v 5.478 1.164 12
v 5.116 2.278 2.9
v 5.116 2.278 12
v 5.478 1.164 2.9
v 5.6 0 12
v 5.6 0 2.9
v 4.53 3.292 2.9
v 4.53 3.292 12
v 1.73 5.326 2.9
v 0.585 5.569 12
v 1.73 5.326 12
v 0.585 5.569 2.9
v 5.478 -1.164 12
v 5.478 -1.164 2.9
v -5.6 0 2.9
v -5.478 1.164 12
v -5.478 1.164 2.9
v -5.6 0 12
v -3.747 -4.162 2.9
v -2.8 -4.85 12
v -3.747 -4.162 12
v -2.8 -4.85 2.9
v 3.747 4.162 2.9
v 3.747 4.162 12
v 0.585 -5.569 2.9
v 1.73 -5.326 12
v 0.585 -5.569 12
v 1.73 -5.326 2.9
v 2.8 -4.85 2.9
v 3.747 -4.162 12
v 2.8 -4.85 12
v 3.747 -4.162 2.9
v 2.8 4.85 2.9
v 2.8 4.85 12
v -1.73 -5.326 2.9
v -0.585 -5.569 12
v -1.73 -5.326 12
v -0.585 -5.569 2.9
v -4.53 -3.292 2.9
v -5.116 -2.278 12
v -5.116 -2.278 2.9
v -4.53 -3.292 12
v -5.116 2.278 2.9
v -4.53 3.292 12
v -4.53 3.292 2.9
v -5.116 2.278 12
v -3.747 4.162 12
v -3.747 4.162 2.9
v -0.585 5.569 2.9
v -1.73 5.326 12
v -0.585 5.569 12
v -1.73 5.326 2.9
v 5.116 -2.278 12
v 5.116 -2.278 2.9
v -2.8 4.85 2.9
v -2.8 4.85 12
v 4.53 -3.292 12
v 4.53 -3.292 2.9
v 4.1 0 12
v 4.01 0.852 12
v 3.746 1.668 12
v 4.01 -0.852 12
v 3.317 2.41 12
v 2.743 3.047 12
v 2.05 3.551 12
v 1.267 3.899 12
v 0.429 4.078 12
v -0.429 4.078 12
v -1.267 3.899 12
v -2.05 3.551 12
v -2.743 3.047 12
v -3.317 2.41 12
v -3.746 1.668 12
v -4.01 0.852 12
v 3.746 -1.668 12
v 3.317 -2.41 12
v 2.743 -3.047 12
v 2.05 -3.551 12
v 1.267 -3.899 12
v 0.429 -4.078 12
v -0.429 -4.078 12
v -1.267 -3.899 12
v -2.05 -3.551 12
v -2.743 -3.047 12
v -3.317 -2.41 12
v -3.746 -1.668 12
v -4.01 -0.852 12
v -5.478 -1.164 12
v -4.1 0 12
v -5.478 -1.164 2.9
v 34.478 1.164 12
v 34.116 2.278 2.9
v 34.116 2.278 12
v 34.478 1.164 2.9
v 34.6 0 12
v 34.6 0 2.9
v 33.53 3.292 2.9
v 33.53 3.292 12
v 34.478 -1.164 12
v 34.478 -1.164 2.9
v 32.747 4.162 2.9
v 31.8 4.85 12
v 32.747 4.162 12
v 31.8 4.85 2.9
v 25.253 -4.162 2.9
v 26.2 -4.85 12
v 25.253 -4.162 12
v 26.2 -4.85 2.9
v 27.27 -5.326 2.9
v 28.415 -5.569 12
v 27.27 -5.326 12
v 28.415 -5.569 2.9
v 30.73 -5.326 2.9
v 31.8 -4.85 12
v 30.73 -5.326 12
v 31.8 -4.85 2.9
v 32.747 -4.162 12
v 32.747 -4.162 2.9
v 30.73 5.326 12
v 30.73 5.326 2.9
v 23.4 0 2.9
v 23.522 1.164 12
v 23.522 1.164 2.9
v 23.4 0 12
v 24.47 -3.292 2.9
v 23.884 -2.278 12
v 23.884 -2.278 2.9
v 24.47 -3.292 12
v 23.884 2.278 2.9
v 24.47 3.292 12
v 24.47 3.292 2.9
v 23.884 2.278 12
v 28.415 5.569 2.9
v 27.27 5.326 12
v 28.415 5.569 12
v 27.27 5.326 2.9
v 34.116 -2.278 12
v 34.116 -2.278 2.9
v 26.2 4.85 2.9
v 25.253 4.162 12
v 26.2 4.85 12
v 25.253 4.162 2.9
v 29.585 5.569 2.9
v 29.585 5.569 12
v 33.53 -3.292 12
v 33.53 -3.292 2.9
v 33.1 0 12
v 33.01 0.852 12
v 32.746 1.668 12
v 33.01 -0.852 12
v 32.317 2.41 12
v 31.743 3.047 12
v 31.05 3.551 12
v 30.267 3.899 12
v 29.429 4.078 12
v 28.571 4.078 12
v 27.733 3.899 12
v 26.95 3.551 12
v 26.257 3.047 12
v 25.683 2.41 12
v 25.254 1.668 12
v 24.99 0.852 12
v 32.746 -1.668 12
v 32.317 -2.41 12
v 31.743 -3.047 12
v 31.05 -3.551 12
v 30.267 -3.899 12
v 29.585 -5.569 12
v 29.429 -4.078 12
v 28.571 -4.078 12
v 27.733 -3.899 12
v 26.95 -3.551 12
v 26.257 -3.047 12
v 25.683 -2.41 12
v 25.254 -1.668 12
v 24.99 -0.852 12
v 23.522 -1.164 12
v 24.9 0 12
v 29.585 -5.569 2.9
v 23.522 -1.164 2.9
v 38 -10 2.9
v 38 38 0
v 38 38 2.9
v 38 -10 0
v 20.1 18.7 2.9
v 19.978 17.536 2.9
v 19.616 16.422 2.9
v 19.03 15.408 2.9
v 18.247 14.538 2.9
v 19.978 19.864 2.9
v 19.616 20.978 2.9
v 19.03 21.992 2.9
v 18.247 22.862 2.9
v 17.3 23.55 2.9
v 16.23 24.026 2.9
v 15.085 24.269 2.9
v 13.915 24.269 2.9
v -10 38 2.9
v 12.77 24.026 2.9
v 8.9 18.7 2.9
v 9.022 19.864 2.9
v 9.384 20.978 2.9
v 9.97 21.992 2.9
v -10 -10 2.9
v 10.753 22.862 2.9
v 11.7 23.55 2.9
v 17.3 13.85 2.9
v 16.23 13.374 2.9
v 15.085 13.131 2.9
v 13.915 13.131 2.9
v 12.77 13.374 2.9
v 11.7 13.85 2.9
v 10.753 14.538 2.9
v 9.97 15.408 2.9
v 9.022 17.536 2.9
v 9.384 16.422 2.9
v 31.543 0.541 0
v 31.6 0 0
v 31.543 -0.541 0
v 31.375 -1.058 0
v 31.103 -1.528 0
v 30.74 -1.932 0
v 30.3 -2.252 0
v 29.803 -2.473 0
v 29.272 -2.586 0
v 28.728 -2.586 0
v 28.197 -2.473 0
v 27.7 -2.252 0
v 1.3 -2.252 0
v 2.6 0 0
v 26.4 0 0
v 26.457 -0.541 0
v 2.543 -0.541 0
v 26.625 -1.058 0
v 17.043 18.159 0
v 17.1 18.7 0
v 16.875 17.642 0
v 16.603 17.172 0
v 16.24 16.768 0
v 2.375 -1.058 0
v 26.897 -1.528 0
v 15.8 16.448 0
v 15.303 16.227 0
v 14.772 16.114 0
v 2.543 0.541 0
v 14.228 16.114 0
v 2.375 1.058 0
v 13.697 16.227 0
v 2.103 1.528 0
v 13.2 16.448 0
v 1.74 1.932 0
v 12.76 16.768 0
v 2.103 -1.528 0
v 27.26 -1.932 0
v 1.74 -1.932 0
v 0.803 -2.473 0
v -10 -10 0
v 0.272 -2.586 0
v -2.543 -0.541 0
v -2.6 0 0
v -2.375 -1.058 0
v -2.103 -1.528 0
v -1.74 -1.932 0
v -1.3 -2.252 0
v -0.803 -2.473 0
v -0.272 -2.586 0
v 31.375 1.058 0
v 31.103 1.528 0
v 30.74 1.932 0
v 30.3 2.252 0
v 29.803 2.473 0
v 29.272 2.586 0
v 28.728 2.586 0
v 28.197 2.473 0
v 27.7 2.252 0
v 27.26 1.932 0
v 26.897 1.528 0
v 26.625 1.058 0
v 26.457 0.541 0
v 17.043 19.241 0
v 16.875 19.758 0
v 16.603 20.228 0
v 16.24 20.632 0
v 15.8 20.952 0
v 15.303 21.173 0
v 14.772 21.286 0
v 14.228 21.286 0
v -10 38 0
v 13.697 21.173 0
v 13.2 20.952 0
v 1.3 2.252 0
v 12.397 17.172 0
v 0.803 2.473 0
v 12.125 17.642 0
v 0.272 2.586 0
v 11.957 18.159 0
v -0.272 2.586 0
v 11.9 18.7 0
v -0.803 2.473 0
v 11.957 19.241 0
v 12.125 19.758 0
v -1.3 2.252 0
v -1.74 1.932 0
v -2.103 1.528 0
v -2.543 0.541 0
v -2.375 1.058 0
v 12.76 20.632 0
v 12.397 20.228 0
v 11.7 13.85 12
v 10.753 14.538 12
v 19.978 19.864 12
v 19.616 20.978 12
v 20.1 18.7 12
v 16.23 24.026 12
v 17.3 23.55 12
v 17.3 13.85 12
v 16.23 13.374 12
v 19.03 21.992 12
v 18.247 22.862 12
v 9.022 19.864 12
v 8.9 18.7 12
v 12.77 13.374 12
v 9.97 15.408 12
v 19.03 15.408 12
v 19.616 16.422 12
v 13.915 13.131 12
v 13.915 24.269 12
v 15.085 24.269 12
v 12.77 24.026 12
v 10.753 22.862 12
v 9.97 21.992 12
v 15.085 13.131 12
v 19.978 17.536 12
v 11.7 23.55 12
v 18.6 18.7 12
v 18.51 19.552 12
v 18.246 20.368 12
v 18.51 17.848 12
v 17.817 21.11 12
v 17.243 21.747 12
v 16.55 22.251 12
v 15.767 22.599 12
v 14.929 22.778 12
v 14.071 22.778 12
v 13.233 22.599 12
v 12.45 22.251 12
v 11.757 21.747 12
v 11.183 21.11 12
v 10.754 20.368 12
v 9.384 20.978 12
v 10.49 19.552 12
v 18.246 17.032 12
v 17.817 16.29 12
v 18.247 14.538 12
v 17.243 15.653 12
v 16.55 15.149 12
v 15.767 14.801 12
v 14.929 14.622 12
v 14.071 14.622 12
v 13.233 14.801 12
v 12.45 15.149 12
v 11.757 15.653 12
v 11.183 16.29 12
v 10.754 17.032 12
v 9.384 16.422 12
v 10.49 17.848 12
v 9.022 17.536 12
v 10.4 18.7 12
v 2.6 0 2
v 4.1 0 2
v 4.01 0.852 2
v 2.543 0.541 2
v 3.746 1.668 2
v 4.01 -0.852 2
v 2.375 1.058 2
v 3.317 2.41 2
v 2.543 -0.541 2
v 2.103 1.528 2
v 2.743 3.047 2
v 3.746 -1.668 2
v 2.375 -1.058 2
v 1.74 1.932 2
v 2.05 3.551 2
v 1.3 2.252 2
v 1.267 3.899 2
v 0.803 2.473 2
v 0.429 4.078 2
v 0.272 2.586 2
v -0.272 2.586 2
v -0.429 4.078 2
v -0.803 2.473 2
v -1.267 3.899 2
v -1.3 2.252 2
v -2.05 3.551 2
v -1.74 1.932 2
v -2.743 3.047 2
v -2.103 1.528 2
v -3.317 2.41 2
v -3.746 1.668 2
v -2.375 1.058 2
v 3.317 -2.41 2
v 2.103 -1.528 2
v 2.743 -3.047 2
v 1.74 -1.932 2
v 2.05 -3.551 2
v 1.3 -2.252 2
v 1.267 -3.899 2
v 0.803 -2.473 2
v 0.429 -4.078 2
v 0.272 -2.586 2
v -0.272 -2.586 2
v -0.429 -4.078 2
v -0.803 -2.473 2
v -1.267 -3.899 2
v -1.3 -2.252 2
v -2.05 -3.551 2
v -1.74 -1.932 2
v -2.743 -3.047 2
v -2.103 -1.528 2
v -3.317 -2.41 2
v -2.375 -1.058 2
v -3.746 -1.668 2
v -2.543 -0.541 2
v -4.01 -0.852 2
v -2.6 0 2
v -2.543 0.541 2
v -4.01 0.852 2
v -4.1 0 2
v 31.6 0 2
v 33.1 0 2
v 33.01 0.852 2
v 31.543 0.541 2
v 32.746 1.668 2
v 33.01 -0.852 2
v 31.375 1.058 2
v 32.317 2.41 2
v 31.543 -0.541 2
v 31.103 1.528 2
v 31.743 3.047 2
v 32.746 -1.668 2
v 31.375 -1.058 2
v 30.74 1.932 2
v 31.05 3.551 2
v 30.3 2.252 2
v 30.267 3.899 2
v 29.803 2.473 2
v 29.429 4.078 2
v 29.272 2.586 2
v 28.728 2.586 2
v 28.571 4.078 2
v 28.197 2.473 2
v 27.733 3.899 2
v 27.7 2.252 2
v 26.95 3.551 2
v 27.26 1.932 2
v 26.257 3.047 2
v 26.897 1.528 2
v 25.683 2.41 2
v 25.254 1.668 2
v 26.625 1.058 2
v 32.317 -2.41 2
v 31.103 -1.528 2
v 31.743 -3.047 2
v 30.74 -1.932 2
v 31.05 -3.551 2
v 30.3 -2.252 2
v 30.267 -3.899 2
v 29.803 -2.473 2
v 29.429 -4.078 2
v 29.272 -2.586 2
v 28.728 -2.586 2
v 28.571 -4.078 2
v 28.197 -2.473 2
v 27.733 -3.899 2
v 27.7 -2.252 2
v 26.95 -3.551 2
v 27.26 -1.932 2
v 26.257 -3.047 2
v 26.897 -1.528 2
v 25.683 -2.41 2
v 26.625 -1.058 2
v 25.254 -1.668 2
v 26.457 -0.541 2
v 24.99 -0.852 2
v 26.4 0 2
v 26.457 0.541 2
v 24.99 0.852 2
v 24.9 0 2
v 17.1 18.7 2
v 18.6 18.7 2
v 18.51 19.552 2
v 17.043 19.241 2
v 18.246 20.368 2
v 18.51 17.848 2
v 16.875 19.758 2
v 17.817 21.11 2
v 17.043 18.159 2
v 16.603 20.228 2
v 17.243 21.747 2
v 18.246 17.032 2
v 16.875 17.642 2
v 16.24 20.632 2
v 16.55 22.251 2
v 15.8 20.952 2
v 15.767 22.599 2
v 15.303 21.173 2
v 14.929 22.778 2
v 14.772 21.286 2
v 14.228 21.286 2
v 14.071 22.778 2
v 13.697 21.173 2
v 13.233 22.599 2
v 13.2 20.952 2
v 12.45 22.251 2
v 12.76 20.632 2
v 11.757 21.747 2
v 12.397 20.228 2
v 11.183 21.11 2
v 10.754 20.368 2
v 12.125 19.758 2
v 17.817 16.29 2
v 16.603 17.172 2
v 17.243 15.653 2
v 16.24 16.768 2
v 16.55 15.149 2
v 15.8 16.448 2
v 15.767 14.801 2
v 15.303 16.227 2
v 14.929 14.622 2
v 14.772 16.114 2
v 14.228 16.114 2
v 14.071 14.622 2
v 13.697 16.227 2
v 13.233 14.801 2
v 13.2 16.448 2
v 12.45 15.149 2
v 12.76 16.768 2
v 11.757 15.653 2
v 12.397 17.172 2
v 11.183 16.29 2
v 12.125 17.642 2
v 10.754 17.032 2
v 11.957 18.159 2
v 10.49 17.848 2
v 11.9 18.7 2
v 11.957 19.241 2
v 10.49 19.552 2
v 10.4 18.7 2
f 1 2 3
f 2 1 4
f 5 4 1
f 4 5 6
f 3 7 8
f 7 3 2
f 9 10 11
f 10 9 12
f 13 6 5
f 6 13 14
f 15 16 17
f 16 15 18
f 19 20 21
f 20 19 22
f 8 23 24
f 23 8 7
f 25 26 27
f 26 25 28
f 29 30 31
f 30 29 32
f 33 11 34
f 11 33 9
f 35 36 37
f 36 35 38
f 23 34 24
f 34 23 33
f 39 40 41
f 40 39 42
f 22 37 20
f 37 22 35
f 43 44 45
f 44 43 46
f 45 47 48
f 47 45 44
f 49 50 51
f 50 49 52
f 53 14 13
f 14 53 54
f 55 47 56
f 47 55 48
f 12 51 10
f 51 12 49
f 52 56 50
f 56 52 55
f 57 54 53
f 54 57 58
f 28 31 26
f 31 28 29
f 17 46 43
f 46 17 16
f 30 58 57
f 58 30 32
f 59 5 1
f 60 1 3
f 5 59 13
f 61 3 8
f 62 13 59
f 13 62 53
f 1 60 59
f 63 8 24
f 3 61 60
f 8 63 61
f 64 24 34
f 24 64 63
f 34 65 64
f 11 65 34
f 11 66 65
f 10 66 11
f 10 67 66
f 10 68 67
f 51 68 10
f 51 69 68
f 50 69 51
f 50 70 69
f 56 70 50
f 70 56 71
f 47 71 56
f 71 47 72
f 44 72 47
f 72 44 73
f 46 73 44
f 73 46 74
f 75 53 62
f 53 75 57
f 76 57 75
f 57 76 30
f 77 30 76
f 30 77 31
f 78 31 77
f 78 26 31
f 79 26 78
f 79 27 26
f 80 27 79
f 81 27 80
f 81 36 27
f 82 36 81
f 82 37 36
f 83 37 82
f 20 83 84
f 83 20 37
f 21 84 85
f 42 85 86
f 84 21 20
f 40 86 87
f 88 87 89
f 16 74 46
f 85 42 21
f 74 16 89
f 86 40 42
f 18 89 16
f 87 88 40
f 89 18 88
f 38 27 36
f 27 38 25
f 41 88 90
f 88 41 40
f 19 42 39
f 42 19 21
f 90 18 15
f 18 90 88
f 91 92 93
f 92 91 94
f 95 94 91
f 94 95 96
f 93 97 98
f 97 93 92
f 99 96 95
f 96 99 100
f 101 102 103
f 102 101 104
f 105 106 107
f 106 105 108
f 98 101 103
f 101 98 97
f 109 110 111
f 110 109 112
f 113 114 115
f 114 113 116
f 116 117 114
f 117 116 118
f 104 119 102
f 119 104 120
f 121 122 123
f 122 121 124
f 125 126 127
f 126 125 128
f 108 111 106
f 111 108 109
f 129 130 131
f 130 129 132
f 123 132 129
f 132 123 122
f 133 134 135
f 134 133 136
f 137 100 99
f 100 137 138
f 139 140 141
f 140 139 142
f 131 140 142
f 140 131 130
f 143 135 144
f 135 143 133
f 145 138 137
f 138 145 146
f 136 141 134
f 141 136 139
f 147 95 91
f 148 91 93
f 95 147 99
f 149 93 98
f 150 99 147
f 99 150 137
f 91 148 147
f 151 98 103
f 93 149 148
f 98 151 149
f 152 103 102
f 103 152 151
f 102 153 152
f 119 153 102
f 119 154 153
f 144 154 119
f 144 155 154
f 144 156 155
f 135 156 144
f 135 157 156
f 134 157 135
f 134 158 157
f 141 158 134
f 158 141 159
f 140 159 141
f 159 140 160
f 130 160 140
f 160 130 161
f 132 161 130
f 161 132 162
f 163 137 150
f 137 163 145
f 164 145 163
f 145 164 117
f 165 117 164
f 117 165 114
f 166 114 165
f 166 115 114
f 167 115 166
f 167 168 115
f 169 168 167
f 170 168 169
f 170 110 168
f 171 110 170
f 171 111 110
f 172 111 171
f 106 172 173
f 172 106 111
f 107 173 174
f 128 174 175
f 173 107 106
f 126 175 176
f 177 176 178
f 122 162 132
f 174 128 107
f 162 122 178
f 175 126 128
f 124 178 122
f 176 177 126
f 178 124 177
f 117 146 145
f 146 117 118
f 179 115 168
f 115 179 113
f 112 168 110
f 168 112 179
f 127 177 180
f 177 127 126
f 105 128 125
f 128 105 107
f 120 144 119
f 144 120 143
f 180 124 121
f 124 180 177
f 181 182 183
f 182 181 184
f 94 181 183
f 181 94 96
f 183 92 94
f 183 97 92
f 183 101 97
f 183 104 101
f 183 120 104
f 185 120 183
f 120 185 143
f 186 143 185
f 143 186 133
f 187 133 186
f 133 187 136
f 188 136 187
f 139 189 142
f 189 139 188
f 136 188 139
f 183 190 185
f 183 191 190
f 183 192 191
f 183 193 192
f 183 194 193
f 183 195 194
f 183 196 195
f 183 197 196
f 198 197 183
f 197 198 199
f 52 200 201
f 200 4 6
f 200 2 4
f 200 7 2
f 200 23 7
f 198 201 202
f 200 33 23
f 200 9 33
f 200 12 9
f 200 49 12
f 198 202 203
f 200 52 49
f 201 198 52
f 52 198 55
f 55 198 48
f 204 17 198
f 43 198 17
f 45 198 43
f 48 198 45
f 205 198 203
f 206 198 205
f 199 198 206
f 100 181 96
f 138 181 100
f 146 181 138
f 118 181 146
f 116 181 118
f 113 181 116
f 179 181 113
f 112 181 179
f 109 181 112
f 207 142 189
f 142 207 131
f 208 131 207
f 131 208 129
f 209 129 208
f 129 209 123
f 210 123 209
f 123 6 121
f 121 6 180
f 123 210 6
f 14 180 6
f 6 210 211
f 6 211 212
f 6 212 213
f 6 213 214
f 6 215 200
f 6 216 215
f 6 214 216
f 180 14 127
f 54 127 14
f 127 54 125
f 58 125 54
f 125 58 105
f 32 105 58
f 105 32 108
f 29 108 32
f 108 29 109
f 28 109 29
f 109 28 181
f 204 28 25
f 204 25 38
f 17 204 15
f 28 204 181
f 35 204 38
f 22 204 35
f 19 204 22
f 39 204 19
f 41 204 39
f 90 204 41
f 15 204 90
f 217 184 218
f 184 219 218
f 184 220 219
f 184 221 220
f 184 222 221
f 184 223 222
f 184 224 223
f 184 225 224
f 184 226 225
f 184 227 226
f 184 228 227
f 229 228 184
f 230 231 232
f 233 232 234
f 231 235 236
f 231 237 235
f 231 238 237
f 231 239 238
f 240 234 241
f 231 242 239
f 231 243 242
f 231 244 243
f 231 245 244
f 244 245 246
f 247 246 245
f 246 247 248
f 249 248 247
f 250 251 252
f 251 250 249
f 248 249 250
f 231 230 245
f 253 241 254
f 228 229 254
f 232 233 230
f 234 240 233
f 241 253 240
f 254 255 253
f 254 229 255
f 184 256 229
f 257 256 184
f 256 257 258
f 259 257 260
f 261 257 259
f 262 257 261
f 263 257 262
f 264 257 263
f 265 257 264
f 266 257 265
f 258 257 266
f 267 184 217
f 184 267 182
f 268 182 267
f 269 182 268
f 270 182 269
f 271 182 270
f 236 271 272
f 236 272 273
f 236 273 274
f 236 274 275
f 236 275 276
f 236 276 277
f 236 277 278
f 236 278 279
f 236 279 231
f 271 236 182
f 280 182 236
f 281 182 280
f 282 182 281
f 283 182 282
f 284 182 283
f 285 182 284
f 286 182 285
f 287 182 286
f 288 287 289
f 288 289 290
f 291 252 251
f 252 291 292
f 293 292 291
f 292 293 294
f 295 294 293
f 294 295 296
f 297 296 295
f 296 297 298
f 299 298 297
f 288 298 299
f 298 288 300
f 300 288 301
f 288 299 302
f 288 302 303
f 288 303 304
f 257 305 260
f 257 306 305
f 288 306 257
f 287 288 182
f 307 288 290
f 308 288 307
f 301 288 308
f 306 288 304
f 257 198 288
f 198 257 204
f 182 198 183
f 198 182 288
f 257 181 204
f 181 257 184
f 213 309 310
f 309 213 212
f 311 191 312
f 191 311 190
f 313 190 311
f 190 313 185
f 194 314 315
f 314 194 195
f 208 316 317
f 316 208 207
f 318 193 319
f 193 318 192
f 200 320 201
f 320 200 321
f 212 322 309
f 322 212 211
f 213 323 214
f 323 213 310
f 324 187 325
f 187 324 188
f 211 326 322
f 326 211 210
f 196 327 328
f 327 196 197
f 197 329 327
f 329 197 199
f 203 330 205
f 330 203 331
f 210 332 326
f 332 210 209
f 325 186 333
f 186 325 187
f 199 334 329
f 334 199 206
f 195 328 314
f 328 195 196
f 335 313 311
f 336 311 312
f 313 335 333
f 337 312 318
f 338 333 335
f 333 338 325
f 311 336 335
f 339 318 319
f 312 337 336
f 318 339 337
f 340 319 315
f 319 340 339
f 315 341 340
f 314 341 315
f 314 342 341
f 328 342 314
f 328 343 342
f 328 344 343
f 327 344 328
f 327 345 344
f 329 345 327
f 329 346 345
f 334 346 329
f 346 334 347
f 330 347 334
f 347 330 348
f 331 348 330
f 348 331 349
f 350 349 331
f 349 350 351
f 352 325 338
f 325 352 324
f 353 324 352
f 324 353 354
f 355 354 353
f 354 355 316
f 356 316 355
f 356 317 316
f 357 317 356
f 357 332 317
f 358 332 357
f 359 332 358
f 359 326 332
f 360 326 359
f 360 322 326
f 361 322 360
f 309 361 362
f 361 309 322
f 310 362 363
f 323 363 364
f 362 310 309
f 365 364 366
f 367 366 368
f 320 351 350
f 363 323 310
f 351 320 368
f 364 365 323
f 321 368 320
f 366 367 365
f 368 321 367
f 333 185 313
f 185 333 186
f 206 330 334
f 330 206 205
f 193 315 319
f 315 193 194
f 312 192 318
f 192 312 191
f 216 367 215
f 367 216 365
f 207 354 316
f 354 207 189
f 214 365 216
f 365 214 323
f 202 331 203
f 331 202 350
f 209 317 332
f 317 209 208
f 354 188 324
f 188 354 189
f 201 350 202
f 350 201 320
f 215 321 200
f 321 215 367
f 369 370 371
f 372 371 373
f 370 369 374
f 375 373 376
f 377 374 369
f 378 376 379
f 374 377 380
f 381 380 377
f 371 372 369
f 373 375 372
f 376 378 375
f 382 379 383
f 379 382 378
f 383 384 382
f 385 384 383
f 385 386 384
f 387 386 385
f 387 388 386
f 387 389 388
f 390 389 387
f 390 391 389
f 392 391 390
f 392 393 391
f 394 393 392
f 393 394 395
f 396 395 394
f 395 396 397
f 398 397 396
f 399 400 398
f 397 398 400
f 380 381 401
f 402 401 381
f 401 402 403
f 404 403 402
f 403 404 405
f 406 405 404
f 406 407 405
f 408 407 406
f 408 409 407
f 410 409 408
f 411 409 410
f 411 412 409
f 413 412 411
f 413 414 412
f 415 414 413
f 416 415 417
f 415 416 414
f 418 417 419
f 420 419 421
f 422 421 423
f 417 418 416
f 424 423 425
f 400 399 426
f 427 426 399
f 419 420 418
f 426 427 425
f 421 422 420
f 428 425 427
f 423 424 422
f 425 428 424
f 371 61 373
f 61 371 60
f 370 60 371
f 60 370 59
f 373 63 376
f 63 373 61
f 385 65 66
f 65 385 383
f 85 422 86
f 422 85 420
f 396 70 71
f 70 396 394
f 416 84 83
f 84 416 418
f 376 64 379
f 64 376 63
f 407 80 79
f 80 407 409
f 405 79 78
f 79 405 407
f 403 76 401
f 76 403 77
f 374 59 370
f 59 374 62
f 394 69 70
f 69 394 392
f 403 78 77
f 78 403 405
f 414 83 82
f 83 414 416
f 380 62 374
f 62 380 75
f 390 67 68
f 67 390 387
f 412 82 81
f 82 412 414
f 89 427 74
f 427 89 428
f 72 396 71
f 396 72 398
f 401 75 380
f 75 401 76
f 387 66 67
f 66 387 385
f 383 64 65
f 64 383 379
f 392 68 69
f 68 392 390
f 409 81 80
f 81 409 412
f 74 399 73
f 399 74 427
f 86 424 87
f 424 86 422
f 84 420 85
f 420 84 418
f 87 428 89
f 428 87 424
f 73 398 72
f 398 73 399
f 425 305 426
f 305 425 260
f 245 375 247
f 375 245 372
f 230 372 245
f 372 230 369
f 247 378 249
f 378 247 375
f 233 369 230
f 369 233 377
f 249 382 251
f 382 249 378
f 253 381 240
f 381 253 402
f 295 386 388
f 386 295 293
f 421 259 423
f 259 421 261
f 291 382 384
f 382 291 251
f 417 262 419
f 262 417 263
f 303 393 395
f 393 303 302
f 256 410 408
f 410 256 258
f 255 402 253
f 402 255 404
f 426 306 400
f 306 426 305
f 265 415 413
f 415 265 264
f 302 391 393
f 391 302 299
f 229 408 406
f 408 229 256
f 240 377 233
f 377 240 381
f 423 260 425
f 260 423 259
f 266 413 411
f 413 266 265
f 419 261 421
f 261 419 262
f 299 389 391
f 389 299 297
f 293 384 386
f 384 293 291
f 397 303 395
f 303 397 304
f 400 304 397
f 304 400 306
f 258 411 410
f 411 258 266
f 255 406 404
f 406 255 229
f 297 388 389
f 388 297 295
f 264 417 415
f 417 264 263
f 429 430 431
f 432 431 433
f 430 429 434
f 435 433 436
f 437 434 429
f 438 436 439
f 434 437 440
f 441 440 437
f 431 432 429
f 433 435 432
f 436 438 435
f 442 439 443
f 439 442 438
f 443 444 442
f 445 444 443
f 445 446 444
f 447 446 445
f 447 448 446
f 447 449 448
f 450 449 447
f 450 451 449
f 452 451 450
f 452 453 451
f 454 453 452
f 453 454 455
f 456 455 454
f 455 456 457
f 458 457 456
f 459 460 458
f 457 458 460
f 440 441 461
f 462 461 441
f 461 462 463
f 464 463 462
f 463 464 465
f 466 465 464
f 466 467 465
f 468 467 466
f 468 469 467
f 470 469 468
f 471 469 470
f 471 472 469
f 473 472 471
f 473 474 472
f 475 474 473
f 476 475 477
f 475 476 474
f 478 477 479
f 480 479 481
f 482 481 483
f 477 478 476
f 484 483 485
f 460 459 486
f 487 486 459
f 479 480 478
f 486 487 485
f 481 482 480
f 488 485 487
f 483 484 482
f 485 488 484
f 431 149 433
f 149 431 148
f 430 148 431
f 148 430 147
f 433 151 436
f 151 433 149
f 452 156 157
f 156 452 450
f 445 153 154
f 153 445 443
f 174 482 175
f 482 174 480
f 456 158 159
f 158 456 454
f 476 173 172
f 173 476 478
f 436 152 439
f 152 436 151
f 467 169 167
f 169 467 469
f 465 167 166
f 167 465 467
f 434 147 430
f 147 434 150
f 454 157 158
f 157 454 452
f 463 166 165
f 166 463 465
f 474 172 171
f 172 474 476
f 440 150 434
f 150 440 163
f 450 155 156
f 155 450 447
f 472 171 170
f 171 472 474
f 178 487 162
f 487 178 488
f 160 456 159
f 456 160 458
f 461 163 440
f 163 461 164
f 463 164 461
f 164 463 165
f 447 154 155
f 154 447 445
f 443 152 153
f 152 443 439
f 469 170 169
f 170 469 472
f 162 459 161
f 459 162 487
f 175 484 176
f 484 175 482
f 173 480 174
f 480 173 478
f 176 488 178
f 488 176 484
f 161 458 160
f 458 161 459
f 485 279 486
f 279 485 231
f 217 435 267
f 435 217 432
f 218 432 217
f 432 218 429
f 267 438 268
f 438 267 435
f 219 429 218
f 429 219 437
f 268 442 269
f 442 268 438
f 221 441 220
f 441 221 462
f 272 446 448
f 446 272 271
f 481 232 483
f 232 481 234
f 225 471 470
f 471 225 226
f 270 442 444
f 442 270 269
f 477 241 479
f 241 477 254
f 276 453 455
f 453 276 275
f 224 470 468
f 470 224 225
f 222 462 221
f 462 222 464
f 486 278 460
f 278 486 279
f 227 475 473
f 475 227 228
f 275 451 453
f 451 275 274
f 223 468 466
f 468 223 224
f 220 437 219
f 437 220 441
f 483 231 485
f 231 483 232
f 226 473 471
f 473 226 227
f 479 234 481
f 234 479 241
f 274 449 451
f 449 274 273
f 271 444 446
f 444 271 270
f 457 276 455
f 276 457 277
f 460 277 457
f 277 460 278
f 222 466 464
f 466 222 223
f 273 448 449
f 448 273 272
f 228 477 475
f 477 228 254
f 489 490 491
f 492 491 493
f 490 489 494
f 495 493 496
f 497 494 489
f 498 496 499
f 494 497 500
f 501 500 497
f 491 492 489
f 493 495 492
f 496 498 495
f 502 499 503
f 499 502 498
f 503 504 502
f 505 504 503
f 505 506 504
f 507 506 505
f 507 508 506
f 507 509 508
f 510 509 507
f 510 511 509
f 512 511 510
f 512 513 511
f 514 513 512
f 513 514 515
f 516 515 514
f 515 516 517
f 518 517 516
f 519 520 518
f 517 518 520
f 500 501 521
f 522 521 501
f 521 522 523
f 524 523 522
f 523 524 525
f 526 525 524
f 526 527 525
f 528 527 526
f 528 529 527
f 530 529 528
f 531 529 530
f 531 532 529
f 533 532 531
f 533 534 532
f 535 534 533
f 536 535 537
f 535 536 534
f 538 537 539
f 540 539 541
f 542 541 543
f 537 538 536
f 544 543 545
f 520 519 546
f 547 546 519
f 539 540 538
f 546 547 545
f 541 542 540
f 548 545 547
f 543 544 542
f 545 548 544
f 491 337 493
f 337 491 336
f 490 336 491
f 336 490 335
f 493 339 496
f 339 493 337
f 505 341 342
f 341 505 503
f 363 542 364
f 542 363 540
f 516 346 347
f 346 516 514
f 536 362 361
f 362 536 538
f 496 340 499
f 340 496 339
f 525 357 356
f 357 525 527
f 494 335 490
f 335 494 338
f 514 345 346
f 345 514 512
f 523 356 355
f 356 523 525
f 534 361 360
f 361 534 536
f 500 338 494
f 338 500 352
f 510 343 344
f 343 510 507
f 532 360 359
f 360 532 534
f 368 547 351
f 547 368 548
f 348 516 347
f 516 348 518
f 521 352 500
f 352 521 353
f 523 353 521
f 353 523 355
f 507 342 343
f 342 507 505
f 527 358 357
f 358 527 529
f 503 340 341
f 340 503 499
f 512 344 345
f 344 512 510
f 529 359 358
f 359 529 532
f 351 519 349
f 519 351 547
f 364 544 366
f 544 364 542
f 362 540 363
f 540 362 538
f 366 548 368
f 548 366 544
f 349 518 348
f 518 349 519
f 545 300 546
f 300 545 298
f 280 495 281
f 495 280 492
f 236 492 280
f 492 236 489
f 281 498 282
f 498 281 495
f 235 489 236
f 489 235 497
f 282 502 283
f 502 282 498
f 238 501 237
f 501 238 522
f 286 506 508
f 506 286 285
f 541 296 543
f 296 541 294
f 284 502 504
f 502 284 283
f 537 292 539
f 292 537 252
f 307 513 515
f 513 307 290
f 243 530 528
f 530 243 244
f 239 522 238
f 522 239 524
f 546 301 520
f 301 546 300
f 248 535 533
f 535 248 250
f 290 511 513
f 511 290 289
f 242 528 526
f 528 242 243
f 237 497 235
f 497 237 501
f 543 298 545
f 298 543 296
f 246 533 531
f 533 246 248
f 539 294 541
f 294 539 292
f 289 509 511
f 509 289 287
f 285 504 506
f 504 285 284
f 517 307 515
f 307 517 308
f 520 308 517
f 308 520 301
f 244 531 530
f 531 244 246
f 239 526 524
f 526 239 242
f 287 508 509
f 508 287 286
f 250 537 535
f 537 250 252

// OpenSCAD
/*
shaker design:
part to hold rollers and sample holders



*/

$fn=30;
tol=0.1;
wallT = 3;
screwD = 5;
screwL = 10;
spacerL = 10;
spacerD = 8;
nrollers = 2;
rollerD = 24;

offset = 5;
rollerVisible = 1;

difference(){
union(){
    translate([-2*offset,-rollerD/2+2,0]){
cube([nrollers*rollerD,2*rollerD,2.9]);
    }
for(i = [1 : nrollers]){
    translate([(i-1)*(rollerD+5),0,2]){
        cylinder(d=spacerD+2*tol+wallT,h=spacerL);   
    }//end translate
}//end for

for(i = [1:nrollers-1]){
    translate([(i-1)*(rollerD+5)+(rollerD+5)/2,rollerD-5.3,2]){
        cylinder(d=spacerD+2*tol+wallT,h=spacerL);
    }//end translate

}//end for

}//end union

for(i = [1 : nrollers]){
    translate([(i-1)*(rollerD+5),0,2]){
        cylinder(d=spacerD+2*tol,h=screwL+10);
        translate([0,0,-5]){
        cylinder(d=screwD+2*tol,h=screwL+20);
            if(rollerVisible==1){
            %cylinder(d=rollerD,h=screwL+20);
            }//end if
        }
    }//end translate

}//end for

for(i = [1:nrollers-1]){
    translate([(i-1)*(rollerD+5)+(rollerD+5)/2,rollerD-5.3,2]){
        cylinder(d=spacerD+2*tol,h=screwL+10);
        translate([0,0,-5]){
        cylinder(d=screwD+2*tol,h=screwL+20);
            if(rollerVisible==1){
            %cylinder(d=rollerD,h=screwL+20);
            }//end if
        }
    }//end translate

}//end for
}//end difference

/*
translate([screwD,8,-1]){
for(i = [1 : nrollers]){
    translate([offset+(i-1)*(rollerD+screwD-2),0,2]){
        cylinder(d=spacerD+2*tol,h=screwL+10);
        translate([0,0,-5]){
        cylinder(d=screwD+2*tol,h=screwL+20);
            if(rollerVisible==1){
            %cylinder(d=rollerD,h=screwL+20);
            }//end if
        }
    }//end translate

}//end for

for(i = [1 : nrollers-1]){
    translate([offset+0.5*(i)*(rollerD+screwD-2),rollerD-rollerD/4+0.1,2]){
        cylinder(d=spacerD+2*tol,h=screwL+10);
        translate([0,0,-5]){
            cylinder(d=screwD+2*tol,h=screwL+20);
            if(rollerVisible==1){
            %cylinder(d=rollerD,h=screwL+20);
            }//end if
            }//end translate
        }//end translate
    }//end for
}//end translate
}//end difference

*/
